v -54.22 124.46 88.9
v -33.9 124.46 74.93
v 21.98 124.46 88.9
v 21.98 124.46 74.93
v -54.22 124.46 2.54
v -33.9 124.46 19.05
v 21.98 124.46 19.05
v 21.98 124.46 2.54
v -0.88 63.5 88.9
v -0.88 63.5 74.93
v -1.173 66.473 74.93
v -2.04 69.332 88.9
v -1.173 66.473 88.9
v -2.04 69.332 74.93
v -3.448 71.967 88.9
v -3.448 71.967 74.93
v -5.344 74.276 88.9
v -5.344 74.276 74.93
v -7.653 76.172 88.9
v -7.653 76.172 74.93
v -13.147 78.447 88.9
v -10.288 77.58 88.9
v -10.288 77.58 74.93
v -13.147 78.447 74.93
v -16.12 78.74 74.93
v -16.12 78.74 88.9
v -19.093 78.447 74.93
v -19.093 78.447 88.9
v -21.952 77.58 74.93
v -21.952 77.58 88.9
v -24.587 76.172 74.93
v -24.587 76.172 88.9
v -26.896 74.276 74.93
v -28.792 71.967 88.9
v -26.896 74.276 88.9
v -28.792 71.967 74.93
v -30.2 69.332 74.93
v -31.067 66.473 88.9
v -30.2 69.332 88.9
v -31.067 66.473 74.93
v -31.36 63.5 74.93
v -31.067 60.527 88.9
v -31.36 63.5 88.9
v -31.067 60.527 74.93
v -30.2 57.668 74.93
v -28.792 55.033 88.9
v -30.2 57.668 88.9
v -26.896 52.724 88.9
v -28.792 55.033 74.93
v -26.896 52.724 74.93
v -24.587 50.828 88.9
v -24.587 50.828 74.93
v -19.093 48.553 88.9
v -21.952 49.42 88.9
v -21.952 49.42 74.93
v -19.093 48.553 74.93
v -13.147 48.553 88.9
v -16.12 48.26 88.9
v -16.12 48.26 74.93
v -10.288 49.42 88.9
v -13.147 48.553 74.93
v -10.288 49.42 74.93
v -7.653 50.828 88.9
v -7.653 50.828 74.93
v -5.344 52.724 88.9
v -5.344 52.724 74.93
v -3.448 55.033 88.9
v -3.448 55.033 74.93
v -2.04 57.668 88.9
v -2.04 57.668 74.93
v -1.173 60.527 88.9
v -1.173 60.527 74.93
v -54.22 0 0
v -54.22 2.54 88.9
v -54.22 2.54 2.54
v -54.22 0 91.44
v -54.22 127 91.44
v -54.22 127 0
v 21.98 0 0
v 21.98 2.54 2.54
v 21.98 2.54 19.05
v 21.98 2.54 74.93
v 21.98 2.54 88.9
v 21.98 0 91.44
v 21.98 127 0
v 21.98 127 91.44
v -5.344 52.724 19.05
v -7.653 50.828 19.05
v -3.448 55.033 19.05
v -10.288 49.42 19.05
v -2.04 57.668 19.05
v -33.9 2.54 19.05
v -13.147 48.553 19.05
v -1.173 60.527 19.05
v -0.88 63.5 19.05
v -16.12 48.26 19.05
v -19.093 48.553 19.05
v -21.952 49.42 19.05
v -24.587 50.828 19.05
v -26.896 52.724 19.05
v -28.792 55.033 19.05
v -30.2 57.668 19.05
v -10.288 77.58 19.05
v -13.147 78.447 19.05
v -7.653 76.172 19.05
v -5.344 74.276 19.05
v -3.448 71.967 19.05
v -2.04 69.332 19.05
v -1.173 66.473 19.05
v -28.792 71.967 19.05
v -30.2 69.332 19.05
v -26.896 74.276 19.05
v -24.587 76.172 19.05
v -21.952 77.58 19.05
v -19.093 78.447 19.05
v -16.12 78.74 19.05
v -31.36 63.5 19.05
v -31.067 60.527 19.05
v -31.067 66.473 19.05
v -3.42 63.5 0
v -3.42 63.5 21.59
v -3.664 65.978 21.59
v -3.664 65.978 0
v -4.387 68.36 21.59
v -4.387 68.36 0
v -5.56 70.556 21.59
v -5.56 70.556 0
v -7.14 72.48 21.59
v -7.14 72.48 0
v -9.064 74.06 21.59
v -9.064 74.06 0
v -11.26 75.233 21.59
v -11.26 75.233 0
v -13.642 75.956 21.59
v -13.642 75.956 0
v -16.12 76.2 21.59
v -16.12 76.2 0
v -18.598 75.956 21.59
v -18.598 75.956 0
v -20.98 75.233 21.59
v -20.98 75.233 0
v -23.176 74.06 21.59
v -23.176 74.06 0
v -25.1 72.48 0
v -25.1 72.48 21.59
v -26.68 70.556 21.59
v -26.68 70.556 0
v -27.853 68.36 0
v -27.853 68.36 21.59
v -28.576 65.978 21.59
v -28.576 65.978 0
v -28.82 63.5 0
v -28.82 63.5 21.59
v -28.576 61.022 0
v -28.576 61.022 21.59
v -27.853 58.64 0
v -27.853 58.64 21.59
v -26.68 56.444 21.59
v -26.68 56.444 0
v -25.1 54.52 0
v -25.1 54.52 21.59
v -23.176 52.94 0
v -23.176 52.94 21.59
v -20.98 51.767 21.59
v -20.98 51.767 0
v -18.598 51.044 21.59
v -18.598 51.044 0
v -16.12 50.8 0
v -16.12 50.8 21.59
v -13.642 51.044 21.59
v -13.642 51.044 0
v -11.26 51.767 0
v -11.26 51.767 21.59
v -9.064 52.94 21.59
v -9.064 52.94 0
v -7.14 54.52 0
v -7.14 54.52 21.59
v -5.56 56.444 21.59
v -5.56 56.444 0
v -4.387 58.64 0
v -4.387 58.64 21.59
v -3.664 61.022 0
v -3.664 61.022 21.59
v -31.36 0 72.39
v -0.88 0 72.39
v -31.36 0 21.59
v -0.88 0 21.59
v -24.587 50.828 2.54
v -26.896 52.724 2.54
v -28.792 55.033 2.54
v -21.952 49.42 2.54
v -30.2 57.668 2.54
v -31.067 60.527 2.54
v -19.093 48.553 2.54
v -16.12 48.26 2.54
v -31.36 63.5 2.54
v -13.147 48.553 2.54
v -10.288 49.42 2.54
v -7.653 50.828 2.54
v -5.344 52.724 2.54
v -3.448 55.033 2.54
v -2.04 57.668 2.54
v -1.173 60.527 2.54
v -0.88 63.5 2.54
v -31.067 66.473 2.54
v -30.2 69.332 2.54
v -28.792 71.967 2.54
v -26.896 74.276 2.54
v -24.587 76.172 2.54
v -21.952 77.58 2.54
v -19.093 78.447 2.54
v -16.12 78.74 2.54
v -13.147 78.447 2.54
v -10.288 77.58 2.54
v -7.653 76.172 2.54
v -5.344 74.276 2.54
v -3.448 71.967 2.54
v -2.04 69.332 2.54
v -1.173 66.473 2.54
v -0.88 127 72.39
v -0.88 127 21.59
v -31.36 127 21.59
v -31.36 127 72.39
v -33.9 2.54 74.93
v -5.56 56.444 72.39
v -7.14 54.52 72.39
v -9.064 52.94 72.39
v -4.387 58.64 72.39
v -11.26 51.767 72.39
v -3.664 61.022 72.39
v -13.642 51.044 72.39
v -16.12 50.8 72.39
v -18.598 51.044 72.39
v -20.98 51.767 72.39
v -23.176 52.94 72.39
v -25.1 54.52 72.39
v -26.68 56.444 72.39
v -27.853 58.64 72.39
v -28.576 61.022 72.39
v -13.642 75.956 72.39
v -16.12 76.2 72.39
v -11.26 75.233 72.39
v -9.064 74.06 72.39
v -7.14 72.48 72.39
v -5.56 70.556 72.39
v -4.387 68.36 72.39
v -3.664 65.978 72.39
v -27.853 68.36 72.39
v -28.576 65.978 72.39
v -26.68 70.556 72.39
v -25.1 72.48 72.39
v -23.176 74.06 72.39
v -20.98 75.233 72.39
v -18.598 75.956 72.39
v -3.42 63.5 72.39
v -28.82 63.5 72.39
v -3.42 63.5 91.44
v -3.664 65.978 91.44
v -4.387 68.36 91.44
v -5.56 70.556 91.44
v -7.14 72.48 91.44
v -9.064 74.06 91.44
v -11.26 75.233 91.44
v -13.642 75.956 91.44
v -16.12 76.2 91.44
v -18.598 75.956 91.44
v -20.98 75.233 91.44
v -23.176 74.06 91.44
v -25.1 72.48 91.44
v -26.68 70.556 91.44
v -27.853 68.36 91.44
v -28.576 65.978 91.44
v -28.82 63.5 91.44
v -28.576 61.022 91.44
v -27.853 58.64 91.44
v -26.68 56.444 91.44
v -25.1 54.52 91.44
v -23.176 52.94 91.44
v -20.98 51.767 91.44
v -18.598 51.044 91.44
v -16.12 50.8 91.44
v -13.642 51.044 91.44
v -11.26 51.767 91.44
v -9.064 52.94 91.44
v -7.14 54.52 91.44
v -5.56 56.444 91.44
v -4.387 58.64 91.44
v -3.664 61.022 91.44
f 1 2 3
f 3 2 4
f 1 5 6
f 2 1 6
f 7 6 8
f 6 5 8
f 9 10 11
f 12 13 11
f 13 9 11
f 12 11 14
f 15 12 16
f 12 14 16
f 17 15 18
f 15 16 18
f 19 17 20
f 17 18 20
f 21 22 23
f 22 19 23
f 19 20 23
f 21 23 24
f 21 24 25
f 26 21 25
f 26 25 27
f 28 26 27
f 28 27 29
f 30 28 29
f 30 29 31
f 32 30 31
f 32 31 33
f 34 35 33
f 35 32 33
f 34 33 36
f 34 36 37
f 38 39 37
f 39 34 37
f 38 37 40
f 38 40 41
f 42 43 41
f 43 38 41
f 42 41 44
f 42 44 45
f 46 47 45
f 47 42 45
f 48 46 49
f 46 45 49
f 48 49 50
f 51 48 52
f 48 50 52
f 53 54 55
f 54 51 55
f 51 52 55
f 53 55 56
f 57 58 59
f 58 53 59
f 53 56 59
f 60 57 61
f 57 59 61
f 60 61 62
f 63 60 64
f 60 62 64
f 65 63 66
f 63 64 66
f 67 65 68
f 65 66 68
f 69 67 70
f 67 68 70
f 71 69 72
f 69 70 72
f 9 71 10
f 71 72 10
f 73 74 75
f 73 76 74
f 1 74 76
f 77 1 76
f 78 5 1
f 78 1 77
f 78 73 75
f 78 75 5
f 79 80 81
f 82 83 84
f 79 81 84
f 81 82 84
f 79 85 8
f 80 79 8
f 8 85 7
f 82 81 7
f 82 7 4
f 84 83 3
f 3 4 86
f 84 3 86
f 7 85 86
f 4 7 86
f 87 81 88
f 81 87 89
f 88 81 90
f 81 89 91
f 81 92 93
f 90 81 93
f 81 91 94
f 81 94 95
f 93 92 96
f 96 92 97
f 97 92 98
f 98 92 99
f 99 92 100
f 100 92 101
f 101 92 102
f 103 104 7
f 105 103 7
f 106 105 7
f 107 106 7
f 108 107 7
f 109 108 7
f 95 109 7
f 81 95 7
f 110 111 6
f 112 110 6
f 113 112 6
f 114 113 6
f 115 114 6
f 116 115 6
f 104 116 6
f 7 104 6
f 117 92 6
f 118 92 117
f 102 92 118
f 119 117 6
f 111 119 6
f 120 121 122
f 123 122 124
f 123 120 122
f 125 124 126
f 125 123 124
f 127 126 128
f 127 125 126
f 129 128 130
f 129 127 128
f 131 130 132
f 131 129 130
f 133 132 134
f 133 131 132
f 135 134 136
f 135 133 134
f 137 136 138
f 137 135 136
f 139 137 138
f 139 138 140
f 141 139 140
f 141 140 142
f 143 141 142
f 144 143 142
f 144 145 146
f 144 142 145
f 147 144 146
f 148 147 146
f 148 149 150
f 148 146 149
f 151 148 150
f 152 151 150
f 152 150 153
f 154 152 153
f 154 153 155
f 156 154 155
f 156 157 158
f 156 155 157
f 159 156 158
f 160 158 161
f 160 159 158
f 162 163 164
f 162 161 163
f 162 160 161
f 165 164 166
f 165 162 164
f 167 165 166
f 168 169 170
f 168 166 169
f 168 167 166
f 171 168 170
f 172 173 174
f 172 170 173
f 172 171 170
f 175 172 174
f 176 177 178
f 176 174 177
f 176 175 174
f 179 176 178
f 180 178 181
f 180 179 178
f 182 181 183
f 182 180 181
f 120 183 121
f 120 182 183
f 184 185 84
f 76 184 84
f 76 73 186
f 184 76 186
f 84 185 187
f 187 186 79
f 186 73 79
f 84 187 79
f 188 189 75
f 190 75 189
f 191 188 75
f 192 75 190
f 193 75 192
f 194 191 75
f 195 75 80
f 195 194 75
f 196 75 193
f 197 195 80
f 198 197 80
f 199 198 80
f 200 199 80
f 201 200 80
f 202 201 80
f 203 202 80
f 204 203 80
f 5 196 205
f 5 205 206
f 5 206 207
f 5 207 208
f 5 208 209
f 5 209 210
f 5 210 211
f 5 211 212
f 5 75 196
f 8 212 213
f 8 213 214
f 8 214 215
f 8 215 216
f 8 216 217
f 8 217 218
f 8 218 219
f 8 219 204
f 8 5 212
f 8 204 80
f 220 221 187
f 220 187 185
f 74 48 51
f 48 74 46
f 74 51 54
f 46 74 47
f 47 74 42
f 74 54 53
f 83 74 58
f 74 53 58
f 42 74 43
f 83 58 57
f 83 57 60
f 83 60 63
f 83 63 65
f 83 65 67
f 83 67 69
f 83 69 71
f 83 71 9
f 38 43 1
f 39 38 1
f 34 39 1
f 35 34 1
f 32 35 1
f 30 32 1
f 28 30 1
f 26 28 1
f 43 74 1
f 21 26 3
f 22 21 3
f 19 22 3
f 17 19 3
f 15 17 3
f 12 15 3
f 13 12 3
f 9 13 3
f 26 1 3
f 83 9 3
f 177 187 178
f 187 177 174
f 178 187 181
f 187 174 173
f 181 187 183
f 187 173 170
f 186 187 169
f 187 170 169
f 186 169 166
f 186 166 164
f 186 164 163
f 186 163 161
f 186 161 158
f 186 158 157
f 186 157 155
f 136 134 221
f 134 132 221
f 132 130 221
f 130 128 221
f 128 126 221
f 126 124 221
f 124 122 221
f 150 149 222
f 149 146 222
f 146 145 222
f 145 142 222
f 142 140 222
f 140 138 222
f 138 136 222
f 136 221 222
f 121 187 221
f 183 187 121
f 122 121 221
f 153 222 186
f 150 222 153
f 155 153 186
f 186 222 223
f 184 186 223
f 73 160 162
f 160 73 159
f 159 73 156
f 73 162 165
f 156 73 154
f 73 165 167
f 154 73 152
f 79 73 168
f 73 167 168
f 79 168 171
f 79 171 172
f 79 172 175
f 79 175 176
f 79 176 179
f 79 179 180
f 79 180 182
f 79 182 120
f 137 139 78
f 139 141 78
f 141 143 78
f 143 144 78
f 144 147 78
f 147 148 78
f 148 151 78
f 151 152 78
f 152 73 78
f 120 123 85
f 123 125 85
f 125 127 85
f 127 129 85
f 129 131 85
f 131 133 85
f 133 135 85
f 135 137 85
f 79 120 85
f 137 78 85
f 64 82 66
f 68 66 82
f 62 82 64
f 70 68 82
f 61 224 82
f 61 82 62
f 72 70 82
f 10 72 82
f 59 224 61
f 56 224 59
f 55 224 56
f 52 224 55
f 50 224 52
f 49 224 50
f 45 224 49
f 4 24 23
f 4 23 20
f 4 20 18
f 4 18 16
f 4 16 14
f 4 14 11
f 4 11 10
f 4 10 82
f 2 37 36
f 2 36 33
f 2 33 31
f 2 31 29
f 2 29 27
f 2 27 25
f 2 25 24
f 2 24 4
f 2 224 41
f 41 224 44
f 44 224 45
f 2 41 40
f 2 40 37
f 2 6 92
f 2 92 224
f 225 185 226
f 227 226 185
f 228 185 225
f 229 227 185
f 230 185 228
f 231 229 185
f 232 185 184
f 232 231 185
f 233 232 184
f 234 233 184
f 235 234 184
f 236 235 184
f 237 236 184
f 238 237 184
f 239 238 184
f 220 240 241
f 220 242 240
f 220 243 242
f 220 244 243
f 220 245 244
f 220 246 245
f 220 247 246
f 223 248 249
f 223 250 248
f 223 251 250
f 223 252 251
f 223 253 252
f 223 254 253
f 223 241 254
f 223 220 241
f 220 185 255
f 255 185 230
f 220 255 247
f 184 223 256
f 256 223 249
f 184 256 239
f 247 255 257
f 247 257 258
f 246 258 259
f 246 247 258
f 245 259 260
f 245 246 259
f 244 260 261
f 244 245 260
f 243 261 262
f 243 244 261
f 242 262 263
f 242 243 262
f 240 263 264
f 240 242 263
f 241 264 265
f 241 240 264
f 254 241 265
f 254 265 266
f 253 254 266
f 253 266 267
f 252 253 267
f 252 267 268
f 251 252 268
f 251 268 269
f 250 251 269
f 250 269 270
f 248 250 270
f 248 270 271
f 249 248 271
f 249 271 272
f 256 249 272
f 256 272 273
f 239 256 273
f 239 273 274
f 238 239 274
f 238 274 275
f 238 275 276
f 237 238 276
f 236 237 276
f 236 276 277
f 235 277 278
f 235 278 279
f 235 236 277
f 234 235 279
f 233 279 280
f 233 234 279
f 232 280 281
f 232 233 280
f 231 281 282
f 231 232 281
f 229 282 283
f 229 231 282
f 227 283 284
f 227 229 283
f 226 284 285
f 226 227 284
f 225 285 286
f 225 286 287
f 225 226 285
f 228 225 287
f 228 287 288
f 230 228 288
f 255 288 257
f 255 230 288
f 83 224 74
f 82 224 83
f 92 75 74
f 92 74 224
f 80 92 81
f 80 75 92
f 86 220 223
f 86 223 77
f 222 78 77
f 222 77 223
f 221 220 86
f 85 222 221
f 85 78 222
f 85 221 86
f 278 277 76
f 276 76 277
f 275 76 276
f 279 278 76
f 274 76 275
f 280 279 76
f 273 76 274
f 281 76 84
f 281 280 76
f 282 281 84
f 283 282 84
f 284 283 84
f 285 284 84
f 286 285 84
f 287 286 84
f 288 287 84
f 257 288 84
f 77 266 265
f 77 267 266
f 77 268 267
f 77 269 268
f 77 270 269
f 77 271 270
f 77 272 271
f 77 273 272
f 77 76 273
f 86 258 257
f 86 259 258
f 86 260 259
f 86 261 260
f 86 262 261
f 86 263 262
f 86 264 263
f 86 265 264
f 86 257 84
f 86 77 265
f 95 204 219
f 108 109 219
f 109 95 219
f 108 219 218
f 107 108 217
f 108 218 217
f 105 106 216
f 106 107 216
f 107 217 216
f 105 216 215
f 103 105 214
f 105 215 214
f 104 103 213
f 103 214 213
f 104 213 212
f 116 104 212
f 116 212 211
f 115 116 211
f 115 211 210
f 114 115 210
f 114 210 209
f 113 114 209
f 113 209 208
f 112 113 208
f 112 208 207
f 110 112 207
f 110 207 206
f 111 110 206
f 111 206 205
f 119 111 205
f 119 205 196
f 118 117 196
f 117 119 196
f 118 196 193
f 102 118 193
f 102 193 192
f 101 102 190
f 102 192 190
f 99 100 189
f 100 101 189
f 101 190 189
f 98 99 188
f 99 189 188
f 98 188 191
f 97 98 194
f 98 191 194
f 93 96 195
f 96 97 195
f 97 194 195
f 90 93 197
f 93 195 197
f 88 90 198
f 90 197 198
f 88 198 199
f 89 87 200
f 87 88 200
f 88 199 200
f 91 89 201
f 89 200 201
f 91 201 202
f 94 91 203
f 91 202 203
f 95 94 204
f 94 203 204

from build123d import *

# Parameters (mm, degrees)
F0_W     = 76.2
F0_H     = 127
F0_R     = 12.7
F1_DEPTH = 91.44
F2_W     = 30.48
F2_H     = 50.8
F3_DEPTH = 143.256
F4_T     = -2.54
F5_DEPTH = 20.32


with BuildPart() as f1:
    # F0 (on Top) → F1 (new body)
    with BuildSketch(Plane.XY):
        with Locations((-16.1199760675, 63.5)):
            Rectangle(F0_W, F0_H)
        with Locations((-16.1199760675, 63.5)):
            Circle(F0_R, mode=Mode.SUBTRACT)
    extrude(amount=F1_DEPTH)

    # F2 (on face) → F3 (cut)
    with BuildSketch(Plane(origin=(0, 127, 0), x_dir=(-1, 0, 0), z_dir=(0, 1, 0))):
        with Locations((16.1199760675, 46.99)):
            Rectangle(F2_W, F2_H)
    extrude(amount=-F3_DEPTH, mode=Mode.SUBTRACT)

    # F4
    f4_openings = [f1.faces().sort_by_distance(p)[0] for p in [
        (21.980024, 63.5, 45.72),
        (-54.219976, 63.5, 45.72),
    ]]
    offset(amount=F4_T, openings=f4_openings, kind=Kind.INTERSECTION)

    # F5 (add): a face of the model
    f5_faces = [f1.faces().sort_by_distance(p)[0] for p in [
        (1.6600239325, 63.5, 46.99),
    ]]
    extrude(f5_faces, amount=F5_DEPTH)


solid = f1.part
